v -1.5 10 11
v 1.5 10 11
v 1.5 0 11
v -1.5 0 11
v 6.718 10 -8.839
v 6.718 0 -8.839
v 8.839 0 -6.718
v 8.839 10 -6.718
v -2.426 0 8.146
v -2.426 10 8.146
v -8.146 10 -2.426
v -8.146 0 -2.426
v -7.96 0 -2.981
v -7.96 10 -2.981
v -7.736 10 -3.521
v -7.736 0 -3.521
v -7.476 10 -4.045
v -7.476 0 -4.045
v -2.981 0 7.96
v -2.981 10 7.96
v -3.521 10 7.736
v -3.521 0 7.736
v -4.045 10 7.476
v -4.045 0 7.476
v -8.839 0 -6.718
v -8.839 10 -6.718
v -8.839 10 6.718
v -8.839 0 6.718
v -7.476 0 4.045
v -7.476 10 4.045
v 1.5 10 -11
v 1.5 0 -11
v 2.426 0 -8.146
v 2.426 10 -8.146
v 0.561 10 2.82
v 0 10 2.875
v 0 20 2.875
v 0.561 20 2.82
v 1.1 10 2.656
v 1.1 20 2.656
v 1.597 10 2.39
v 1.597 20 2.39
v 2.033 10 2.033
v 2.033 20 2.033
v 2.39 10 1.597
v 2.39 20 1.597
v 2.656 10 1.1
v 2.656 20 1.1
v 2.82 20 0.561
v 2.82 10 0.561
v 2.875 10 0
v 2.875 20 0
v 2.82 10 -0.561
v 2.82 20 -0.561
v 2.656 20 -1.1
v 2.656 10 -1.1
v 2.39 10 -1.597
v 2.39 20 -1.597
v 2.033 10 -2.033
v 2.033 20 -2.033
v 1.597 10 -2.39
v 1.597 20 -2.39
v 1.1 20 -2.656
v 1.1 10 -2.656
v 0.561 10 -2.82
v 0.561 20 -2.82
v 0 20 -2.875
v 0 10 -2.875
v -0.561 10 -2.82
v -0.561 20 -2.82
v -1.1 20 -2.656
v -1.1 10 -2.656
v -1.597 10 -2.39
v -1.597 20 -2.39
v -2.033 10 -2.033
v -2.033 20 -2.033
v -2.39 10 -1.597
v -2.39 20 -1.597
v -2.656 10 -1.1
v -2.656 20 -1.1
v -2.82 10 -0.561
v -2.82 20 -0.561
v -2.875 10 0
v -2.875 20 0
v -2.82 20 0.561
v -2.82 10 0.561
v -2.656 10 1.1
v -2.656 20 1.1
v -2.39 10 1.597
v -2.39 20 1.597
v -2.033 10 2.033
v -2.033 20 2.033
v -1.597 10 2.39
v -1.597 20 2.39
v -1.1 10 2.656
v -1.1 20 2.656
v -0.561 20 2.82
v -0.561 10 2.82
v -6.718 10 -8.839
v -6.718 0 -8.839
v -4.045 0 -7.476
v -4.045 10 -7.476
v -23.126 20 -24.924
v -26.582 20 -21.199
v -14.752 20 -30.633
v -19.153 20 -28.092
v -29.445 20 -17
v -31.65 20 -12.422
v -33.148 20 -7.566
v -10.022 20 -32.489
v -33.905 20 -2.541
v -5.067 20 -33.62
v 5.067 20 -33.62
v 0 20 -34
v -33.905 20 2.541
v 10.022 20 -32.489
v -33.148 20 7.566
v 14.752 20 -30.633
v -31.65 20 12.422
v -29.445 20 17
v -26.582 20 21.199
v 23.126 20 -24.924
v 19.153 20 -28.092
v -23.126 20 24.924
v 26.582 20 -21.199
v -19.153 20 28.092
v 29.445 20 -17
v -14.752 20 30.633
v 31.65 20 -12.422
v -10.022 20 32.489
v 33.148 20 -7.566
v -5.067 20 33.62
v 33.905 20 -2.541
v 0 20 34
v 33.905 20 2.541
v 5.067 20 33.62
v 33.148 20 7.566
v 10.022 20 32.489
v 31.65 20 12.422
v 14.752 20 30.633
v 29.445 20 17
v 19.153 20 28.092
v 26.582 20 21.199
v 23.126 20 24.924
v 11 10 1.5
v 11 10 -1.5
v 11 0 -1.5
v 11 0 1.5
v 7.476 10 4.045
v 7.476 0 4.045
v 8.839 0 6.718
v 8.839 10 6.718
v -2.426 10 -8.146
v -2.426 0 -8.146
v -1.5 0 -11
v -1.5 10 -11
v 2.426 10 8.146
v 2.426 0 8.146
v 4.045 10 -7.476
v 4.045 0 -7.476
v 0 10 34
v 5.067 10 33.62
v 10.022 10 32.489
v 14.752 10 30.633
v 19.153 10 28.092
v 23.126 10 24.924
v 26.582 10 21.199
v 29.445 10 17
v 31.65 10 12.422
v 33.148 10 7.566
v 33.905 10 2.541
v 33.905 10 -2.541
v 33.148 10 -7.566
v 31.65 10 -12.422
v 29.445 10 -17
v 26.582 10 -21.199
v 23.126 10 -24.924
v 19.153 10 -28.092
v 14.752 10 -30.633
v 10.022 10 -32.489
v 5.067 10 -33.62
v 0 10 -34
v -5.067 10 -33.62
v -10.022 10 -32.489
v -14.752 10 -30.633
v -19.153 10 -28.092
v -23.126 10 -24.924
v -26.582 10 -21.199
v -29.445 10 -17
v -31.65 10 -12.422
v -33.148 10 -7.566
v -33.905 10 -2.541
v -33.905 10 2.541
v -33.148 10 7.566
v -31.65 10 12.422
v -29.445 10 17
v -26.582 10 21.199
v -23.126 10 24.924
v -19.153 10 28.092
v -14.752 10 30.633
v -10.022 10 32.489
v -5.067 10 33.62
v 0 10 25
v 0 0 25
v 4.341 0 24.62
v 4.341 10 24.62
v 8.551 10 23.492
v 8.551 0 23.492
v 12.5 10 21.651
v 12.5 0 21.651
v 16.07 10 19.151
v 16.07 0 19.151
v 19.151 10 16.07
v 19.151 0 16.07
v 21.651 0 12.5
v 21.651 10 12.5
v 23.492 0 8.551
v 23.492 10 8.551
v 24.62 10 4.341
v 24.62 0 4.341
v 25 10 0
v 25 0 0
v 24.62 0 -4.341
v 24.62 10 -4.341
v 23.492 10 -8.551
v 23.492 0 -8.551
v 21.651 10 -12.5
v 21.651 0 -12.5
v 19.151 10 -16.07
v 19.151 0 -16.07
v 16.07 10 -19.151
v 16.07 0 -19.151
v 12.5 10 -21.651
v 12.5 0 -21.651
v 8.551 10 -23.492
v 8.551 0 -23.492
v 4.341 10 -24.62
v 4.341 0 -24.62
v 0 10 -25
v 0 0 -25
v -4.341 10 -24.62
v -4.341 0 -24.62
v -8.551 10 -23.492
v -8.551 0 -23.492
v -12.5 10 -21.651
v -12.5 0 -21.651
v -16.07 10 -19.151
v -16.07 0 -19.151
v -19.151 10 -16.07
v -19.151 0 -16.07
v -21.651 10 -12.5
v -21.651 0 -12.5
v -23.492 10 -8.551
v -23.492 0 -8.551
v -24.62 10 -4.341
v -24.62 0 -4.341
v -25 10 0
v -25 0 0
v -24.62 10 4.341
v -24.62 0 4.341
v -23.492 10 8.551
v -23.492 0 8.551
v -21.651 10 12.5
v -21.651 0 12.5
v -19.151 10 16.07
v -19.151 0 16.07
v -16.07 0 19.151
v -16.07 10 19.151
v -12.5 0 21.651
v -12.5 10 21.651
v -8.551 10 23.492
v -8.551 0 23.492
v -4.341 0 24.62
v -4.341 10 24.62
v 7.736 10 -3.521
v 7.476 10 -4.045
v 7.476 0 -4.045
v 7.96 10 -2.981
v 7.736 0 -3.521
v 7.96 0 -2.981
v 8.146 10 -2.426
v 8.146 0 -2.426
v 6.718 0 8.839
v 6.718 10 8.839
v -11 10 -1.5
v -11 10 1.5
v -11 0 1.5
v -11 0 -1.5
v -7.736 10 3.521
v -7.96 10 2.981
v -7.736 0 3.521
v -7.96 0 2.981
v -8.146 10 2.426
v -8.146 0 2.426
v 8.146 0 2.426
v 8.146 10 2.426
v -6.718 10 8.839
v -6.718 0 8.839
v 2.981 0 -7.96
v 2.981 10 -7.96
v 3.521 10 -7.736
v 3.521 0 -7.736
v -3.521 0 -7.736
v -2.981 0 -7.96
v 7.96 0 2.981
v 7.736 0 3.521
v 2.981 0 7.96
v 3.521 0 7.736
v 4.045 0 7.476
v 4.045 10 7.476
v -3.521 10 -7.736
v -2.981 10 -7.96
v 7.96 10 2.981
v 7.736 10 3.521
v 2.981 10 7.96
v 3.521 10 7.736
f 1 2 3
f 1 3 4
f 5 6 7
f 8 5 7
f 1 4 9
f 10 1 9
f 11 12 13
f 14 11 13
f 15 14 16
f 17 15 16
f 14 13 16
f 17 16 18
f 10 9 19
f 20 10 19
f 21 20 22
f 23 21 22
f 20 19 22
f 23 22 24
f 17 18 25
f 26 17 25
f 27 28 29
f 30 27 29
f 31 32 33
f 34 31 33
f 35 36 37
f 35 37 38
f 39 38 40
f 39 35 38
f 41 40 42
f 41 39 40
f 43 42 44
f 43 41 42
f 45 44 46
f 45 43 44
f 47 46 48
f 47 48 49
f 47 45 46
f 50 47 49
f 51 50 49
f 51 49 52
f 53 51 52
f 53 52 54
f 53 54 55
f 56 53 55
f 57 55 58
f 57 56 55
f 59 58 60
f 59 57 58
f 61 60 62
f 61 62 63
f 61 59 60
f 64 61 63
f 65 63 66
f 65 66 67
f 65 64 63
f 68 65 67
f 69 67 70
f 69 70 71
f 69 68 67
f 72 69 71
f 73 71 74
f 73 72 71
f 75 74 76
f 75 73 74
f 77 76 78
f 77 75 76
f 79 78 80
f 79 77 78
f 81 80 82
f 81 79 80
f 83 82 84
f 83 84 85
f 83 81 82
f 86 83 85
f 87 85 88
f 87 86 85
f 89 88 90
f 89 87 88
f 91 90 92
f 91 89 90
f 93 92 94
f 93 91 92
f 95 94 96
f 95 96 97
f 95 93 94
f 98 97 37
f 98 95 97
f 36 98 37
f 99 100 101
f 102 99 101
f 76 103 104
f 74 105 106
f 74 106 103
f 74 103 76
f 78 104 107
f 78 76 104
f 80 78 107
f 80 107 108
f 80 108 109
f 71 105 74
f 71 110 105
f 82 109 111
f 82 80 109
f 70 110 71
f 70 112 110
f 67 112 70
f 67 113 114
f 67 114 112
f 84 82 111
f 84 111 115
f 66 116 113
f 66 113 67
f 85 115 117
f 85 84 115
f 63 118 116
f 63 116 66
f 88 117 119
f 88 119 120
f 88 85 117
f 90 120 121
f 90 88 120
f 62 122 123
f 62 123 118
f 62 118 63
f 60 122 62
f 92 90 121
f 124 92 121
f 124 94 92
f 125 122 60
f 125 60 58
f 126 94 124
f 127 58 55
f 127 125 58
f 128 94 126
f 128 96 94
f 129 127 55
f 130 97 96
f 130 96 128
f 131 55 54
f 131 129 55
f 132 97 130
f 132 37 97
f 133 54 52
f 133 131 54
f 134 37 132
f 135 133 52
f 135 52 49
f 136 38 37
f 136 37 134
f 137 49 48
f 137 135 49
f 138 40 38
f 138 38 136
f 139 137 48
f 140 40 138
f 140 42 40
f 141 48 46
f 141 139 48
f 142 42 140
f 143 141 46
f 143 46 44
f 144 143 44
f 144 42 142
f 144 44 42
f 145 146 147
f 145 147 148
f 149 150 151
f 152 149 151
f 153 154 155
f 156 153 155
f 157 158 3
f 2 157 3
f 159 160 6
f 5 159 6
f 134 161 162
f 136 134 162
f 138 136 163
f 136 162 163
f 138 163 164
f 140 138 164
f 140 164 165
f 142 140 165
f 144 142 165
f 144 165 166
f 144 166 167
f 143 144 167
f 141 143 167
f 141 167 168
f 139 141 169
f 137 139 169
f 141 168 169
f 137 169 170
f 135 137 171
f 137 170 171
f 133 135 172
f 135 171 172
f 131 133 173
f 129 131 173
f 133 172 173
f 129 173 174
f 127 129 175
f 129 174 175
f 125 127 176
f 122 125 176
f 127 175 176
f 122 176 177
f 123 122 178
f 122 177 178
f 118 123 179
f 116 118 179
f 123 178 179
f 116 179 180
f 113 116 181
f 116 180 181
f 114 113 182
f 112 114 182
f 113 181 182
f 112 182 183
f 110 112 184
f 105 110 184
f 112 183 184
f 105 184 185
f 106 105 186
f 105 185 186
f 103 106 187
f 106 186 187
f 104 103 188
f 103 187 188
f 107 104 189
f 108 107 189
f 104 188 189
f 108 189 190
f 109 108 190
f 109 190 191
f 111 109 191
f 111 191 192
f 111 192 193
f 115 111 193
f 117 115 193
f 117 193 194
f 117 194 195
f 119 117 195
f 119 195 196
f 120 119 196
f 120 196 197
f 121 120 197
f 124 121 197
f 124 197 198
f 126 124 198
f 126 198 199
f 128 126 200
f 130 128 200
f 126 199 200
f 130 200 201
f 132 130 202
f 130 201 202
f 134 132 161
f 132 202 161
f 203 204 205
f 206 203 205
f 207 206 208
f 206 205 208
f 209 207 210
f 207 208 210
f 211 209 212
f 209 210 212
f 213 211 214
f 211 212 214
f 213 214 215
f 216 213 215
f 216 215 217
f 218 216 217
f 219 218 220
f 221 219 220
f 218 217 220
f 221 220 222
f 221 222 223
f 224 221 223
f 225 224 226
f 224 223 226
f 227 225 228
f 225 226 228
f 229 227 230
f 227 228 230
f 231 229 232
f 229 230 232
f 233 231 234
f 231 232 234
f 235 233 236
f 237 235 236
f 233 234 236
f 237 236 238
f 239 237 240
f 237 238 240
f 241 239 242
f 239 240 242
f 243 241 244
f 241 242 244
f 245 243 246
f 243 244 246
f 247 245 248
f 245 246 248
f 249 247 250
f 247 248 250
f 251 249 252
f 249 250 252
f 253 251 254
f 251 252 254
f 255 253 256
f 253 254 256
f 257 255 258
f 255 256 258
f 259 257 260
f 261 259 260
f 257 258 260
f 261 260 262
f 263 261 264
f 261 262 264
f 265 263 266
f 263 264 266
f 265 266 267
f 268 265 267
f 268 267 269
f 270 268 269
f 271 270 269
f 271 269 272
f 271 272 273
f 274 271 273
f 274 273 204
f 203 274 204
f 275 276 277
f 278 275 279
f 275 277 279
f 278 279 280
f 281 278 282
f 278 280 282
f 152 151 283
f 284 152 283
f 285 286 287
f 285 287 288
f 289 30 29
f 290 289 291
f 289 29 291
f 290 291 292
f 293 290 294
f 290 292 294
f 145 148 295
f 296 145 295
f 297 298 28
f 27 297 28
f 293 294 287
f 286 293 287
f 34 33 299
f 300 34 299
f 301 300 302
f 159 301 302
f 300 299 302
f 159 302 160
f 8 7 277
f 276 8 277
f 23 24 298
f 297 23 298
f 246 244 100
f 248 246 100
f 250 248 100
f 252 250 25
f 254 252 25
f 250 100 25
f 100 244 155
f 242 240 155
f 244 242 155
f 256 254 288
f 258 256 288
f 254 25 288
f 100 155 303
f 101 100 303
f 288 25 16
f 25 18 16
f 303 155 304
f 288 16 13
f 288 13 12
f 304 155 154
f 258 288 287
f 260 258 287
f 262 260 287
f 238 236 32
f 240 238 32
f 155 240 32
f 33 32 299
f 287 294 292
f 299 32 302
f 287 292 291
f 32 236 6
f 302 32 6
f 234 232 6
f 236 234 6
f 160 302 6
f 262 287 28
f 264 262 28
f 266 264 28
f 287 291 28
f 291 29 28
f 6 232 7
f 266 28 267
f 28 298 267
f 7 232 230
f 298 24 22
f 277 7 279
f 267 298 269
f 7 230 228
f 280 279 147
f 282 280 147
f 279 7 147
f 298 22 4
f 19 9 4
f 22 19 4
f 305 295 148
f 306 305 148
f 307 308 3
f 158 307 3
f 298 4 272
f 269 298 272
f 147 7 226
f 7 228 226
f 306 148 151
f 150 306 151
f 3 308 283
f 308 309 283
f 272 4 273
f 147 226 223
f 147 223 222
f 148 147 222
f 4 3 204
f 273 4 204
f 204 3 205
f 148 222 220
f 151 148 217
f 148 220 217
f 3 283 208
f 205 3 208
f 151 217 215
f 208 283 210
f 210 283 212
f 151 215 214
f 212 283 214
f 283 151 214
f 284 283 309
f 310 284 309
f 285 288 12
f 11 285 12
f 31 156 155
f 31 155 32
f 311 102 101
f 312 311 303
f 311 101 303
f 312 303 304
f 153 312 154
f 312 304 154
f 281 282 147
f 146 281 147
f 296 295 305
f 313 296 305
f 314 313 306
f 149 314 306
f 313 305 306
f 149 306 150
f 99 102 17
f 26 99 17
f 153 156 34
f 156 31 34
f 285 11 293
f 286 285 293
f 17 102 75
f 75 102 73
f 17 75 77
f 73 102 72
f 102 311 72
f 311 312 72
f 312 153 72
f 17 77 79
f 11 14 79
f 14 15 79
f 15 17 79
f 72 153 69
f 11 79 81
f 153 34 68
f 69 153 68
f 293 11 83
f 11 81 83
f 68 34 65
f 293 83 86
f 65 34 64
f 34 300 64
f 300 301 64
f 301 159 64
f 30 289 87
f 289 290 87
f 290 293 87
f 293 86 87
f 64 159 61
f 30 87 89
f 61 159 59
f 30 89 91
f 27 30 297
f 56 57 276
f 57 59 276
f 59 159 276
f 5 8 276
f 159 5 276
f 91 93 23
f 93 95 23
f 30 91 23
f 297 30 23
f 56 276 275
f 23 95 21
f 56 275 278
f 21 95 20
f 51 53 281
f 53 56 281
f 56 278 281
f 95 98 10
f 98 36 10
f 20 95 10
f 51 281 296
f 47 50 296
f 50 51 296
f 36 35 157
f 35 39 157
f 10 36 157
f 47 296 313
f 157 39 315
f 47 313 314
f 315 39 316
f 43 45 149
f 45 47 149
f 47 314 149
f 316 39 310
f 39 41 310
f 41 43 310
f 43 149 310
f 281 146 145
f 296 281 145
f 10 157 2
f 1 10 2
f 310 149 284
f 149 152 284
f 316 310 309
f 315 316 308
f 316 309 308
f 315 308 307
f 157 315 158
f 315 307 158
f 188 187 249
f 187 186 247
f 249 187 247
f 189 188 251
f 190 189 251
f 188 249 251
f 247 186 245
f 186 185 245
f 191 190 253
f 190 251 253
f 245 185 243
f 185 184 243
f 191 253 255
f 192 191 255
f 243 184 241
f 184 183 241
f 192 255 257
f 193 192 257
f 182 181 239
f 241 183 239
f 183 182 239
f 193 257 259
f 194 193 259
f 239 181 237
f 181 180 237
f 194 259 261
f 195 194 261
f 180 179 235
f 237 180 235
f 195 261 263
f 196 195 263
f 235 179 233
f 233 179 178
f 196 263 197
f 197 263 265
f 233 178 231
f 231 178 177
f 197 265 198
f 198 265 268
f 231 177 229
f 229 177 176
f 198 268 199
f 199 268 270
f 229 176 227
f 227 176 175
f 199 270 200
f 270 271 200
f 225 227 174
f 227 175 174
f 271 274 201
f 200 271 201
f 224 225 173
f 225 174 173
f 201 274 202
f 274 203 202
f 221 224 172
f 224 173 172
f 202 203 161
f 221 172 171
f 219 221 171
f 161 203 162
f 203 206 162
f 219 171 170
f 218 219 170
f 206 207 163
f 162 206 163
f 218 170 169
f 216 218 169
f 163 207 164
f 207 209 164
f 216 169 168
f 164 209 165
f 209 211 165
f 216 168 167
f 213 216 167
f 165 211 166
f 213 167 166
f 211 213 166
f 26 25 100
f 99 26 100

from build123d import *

# Parameters (mm, degrees)
SKETCH1_R           = 25
BOSS_EXTRUDE1_DEPTH = 10
SKETCH2_R           = 34
SKETCH2_R_2         = 2.875
BOSS_EXTRUDE2_DEPTH = 10


with BuildPart() as part:
    # Sketch1 → Boss-Extrude1 (new body)
    with BuildSketch(Plane(origin=(0, 0, 0), x_dir=(1, 0, 0), z_dir=(0, 1, 0))):
        with Locations(Location((0, 0, 0), (0, 0, 270))):
            Circle(SKETCH1_R)
        with BuildLine():
            Line((-1.5, 11), (1.5, 11))
            Line((1.5, 11), (2.425924848, 8.146464793))
            ThreePointArc((2.425924848, 8.146464793), (3.252809175, 7.852976026), (4.045032587, 7.475808409))
            Line((4.045032587, 7.475808409), (6.717514421, 8.838834765))
            Line((6.717514421, 8.838834765), (8.838834765, 6.717514421))
            Line((8.838834765, 6.717514421), (7.475808409, 4.045032587))
            ThreePointArc((7.475808409, 4.045032587), (7.852976026, 3.252809175), (8.146464793, 2.425924848))
            Line((8.146464793, 2.425924848), (11, 1.5))
            Line((11, 1.5), (11, -1.5))
            Line((11, -1.5), (8.146464793, -2.425924848))
            ThreePointArc((8.146464793, -2.425924848), (7.852976026, -3.252809175), (7.475808409, -4.045032587))
            Line((7.475808409, -4.045032587), (8.838834765, -6.717514421))
            Line((8.838834765, -6.717514421), (6.717514421, -8.838834765))
            Line((6.717514421, -8.838834765), (4.045032587, -7.475808409))
            ThreePointArc((4.045032587, -7.475808409), (3.252809175, -7.852976026), (2.425924848, -8.146464793))
            Line((2.425924848, -8.146464793), (1.5, -11))
            Line((1.5, -11), (-1.5, -11))
            Line((-1.5, -11), (-2.425924848, -8.146464793))
            ThreePointArc((-2.425924848, -8.146464793), (-3.252809175, -7.852976026), (-4.045032587, -7.475808409))
            Line((-4.045032587, -7.475808409), (-6.717514421, -8.838834765))
            Line((-6.717514421, -8.838834765), (-8.838834765, -6.717514421))
            Line((-8.838834765, -6.717514421), (-7.475808409, -4.045032587))
            ThreePointArc((-7.475808409, -4.045032587), (-7.852976026, -3.252809175), (-8.146464793, -2.425924848))
            Line((-8.146464793, -2.425924848), (-11, -1.5))
            Line((-11, -1.5), (-11, 1.5))
            Line((-11, 1.5), (-8.146464793, 2.425924848))
            ThreePointArc((-8.146464793, 2.425924848), (-7.852976026, 3.252809175), (-7.475808409, 4.045032587))
            Line((-7.475808409, 4.045032587), (-8.838834765, 6.717514421))
            Line((-8.838834765, 6.717514421), (-6.717514421, 8.838834765))
            Line((-6.717514421, 8.838834765), (-4.045032587, 7.475808409))
            ThreePointArc((-4.045032587, 7.475808409), (-3.252809175, 7.852976026), (-2.425924848, 8.146464793))
            Line((-2.425924848, 8.146464793), (-1.5, 11))
        make_face(mode=Mode.SUBTRACT)
    extrude(amount=BOSS_EXTRUDE1_DEPTH)

    # Sketch2 → Boss-Extrude2 (add)
    with BuildSketch(Plane(origin=(0, 10, 0), x_dir=(1, 0, 0), z_dir=(0, 1, 0))):
        with Locations(Location((0, 0, 0), (0, 0, 270))):
            Circle(SKETCH2_R)
        with Locations(Location((0, 0, 0), (0, 0, 270))):
            Circle(SKETCH2_R_2, mode=Mode.SUBTRACT)
    extrude(amount=BOSS_EXTRUDE2_DEPTH)


solid = part.part
